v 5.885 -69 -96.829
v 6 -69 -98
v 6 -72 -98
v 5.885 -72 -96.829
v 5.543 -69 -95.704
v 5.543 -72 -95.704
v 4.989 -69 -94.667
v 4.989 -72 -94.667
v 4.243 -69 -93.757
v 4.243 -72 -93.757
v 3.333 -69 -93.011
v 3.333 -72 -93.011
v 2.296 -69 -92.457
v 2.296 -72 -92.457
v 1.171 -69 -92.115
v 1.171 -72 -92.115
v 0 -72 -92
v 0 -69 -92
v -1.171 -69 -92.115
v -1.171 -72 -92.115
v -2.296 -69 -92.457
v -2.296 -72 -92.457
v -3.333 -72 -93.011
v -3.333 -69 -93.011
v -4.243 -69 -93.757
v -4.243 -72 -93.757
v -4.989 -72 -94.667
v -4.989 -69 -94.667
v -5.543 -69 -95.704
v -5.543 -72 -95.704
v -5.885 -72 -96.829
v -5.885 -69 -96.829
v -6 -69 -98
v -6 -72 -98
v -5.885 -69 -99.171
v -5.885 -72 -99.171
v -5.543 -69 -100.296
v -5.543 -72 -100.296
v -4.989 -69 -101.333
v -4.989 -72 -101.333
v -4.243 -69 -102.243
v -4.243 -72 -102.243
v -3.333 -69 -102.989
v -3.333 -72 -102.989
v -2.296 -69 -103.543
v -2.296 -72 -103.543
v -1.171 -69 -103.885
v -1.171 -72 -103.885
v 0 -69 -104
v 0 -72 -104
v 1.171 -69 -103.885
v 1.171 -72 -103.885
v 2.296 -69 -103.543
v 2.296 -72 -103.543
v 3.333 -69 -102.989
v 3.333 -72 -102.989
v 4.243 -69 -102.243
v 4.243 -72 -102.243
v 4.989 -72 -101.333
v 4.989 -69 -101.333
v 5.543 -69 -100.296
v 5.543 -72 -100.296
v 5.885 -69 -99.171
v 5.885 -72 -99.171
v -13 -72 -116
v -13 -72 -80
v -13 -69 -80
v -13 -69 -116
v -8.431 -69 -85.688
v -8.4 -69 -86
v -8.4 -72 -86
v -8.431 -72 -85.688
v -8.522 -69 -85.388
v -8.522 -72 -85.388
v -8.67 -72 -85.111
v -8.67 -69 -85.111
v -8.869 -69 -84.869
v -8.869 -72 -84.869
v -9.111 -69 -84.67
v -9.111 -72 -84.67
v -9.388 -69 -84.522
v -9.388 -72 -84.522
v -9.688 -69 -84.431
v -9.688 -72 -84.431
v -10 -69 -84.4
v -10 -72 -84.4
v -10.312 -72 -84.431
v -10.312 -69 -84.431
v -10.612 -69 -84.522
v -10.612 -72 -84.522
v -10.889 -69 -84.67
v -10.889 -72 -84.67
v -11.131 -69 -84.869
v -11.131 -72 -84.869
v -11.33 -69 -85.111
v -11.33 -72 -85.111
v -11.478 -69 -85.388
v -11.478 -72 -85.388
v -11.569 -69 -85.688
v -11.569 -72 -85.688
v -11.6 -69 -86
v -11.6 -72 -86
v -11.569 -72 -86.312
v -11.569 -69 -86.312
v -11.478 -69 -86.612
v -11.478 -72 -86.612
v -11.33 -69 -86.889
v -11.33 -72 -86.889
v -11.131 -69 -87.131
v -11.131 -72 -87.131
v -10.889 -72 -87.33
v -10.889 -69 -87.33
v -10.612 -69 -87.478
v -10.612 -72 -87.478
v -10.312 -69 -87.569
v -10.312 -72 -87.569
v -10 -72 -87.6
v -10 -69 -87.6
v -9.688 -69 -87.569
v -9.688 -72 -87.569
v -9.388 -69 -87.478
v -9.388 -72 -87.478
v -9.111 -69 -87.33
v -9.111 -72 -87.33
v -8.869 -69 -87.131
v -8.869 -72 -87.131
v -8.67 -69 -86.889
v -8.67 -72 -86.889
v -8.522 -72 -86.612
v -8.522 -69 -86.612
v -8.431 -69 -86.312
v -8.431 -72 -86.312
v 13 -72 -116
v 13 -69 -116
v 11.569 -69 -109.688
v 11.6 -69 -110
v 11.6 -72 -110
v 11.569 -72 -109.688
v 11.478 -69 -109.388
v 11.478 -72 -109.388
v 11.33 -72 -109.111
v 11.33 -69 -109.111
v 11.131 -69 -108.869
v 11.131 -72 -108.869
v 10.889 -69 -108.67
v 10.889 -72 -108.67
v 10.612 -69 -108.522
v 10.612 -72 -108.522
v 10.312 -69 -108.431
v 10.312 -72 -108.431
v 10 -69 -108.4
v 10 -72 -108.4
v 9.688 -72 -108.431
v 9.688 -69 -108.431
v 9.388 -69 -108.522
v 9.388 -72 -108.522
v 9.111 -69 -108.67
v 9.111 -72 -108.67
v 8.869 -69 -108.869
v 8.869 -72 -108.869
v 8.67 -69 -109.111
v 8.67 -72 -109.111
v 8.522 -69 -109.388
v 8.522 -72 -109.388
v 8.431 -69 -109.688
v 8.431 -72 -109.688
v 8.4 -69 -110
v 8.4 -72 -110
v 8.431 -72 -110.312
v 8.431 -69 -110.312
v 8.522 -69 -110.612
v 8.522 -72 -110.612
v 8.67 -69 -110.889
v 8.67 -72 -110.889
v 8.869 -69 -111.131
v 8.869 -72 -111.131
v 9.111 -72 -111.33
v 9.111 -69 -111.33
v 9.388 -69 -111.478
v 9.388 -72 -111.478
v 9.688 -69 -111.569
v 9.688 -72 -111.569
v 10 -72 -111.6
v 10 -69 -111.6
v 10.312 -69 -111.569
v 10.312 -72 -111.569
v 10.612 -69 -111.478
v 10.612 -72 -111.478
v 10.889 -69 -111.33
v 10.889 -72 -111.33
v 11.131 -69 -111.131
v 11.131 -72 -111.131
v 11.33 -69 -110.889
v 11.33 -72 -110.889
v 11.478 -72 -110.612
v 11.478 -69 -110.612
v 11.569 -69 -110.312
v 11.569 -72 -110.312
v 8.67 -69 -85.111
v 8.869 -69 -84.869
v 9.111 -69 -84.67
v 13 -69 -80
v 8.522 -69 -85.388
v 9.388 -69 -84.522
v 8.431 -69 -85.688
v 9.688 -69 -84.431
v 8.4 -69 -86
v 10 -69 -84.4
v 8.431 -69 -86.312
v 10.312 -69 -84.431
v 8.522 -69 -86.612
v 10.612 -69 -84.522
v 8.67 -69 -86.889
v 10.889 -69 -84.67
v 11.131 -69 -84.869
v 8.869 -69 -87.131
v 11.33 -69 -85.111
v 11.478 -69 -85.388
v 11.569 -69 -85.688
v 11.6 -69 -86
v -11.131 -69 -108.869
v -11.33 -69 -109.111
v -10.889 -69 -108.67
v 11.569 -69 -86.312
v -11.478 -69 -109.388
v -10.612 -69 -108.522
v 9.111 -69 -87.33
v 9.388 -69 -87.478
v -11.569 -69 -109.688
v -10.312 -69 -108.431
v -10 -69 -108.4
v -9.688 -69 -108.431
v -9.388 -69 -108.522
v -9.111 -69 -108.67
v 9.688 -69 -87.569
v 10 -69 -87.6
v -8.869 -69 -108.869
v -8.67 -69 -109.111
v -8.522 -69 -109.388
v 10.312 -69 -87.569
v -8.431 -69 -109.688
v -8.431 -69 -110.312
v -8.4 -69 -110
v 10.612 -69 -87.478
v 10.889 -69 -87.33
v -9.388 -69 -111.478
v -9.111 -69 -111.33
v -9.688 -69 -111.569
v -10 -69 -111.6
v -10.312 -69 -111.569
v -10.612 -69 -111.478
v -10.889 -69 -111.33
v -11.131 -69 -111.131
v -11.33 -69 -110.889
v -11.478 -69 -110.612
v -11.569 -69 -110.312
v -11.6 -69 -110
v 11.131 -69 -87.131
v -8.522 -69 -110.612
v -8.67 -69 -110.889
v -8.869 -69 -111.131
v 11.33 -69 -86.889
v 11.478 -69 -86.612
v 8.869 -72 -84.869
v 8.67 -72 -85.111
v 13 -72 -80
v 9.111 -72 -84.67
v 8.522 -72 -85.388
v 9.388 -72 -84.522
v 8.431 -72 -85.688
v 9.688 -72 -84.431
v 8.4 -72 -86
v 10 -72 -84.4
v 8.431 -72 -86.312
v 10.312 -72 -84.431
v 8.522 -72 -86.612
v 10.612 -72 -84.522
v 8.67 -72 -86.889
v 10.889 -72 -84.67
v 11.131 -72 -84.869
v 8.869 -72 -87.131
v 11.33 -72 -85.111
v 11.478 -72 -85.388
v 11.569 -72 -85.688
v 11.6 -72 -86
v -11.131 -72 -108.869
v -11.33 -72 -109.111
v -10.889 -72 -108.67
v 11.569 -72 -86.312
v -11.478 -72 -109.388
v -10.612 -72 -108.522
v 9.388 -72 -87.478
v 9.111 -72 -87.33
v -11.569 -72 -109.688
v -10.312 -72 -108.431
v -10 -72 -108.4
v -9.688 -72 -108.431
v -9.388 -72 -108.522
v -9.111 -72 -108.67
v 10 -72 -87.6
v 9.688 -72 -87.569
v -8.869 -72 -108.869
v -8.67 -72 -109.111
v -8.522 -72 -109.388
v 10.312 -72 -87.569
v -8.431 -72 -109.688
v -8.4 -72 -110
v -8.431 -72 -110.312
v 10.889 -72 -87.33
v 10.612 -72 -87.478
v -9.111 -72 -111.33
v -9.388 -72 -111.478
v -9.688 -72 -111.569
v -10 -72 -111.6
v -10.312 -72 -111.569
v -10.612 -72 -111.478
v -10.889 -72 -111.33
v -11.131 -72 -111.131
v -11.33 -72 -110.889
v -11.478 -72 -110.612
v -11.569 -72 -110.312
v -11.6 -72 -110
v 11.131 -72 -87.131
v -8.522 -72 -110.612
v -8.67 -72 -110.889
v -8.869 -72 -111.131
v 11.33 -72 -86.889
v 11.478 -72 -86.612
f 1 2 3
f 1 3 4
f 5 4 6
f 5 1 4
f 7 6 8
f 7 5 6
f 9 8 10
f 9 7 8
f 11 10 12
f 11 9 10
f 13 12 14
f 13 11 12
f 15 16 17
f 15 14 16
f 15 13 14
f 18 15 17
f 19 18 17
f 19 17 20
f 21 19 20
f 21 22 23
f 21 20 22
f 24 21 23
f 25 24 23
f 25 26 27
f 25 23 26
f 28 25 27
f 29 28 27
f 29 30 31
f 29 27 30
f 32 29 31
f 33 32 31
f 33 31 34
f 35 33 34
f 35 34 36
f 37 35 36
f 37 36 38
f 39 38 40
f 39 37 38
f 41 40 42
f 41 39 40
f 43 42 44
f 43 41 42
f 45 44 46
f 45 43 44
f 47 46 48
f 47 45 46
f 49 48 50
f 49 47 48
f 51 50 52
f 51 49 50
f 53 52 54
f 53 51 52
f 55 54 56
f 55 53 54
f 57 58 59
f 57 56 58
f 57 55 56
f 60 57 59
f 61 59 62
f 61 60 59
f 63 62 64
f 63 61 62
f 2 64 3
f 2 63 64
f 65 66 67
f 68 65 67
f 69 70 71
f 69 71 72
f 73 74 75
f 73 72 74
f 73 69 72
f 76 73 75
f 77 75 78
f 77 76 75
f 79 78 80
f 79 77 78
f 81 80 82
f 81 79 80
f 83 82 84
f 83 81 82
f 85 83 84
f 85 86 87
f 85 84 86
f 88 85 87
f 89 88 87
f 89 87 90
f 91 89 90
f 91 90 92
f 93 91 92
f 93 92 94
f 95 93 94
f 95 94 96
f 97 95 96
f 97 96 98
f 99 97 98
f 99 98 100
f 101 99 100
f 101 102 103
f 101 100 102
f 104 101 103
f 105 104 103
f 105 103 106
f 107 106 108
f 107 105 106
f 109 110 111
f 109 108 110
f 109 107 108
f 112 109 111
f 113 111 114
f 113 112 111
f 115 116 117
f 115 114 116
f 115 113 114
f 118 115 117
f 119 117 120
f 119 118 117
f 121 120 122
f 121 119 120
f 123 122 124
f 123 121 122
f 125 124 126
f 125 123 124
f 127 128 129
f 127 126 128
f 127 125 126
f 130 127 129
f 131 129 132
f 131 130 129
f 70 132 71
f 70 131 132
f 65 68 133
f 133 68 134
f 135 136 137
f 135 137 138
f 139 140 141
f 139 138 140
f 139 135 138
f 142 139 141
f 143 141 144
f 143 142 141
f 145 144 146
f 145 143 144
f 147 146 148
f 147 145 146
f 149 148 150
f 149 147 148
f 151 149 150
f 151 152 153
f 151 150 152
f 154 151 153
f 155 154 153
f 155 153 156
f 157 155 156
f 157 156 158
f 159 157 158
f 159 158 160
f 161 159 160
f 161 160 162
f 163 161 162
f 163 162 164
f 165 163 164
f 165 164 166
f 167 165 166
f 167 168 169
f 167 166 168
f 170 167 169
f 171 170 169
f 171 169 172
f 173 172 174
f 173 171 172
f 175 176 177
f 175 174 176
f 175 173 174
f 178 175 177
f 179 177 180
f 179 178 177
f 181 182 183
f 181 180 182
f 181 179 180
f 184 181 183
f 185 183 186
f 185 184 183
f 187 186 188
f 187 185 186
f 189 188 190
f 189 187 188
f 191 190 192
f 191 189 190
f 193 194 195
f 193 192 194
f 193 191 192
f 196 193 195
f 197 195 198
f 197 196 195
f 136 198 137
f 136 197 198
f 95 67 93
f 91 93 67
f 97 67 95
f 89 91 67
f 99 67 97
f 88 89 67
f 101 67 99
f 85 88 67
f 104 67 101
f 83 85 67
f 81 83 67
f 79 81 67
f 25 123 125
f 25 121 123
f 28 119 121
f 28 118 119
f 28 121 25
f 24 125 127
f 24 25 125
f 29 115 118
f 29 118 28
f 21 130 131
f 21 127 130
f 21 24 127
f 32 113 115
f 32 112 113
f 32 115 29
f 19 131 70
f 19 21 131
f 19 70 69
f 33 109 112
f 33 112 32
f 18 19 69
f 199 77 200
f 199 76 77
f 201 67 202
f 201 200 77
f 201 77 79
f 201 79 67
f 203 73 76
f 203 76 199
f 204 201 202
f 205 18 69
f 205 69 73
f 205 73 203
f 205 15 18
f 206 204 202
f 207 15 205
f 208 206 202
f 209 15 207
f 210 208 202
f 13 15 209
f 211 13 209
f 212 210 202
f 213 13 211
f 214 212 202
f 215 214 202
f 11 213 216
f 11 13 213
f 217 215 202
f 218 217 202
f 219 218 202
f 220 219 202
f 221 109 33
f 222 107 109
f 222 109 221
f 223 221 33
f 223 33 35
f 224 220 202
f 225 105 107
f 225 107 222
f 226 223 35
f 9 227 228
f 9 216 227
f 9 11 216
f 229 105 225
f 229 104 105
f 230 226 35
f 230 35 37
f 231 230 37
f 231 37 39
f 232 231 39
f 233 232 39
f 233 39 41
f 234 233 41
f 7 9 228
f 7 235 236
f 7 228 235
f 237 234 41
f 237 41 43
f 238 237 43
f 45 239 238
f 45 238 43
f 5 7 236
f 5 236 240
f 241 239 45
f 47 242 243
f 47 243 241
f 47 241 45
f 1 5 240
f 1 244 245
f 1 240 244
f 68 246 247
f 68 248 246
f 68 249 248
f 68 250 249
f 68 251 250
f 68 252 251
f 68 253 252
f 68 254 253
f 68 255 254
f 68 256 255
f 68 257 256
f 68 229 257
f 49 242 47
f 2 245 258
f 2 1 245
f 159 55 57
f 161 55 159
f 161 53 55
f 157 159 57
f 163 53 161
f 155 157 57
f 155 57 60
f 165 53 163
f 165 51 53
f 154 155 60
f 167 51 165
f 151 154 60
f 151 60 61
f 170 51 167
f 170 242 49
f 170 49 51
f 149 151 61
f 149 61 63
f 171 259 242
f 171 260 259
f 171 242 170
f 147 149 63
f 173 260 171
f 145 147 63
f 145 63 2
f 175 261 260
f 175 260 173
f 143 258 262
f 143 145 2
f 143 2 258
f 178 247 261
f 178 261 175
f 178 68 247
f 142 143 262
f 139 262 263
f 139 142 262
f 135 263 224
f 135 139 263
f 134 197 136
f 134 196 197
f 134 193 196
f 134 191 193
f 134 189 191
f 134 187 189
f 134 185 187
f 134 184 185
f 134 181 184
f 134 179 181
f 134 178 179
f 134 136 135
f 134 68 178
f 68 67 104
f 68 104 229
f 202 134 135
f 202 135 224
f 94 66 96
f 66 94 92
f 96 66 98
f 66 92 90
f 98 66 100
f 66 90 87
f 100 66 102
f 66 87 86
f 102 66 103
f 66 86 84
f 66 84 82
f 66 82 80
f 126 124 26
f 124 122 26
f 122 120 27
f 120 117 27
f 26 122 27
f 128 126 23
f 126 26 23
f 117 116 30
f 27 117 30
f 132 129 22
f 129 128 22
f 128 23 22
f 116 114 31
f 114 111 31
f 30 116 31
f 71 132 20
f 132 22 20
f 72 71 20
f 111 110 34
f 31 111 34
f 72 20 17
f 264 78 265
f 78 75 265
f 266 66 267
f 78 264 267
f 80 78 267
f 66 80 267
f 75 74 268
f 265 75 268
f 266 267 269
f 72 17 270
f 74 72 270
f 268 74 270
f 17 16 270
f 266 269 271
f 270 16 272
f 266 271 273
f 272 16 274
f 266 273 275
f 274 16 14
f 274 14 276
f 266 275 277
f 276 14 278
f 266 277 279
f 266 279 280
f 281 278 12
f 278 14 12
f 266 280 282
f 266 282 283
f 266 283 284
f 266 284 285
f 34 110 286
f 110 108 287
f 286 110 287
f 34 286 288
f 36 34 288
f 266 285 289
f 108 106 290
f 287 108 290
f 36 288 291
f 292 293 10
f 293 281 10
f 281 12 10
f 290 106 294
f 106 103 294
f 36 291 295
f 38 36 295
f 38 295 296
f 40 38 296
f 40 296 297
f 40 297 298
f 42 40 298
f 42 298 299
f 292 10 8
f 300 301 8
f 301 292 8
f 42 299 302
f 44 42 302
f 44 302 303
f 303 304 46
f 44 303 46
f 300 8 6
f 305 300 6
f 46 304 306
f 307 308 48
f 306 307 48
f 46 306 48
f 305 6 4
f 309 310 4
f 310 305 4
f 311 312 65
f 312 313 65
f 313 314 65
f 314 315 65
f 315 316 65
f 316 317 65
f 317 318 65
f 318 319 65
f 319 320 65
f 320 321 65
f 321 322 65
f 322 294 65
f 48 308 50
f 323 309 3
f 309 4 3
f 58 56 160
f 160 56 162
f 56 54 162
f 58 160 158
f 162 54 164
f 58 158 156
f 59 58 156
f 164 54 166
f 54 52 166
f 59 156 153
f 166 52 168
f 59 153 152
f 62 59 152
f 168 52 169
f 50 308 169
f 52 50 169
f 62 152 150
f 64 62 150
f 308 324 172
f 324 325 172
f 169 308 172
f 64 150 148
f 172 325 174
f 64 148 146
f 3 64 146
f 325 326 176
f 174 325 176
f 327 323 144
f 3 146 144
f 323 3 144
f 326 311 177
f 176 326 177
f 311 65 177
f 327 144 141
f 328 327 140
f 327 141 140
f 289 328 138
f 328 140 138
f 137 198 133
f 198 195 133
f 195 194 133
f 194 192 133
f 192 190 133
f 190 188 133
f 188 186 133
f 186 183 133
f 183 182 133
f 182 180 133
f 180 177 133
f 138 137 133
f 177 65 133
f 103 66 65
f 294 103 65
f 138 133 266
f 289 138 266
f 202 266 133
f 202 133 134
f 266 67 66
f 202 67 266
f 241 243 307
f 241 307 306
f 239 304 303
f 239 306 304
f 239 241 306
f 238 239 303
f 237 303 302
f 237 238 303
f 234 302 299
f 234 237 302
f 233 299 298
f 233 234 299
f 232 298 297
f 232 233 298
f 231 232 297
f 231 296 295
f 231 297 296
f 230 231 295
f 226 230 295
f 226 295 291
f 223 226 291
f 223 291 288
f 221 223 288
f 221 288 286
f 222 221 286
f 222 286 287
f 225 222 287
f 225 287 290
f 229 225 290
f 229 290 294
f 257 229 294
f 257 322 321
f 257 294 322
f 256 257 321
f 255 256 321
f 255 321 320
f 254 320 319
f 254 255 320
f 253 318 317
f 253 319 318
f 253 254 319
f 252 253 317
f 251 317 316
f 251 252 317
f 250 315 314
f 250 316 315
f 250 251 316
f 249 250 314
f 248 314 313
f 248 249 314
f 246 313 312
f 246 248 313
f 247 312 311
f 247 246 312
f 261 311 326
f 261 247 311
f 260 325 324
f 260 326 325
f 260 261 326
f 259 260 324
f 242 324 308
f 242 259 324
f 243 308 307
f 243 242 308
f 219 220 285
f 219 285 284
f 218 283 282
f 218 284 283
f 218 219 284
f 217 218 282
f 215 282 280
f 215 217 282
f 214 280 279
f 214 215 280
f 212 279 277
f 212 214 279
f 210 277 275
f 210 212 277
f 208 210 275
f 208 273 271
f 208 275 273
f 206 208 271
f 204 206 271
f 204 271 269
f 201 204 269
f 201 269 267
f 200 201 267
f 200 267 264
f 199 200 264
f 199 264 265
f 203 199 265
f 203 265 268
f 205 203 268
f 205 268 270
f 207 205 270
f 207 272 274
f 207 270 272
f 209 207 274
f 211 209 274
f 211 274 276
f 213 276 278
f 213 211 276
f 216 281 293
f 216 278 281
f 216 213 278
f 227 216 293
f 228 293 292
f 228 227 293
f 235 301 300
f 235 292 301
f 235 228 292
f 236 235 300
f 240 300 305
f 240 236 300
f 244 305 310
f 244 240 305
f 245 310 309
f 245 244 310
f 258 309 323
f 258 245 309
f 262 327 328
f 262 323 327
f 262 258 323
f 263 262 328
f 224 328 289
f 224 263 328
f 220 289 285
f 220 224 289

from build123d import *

# Parameters (mm, degrees)
CYLINDER1875_R     = 1.6
CYLINDER1875_DEPTH = 80
CYLINDER1873_R     = 1.6
CYLINDER1873_DEPTH = 80
CYLINDER1874_R     = 1.6
CYLINDER1874_DEPTH = 80
CYLINDER1872_R     = 1.6
CYLINDER1872_DEPTH = 80
CYLINDER1871_R     = 6
CYLINDER1871_DEPTH = 20
BOX745_W           = 26
BOX745_H           = 3
BOX745_DEPTH       = 36


with BuildPart() as v_lec1875:
    # Cylinder1875 → Cylinder1875 (new body)
    with BuildSketch(Plane(origin=(-10, 80, 31), x_dir=(1, 0, 0), z_dir=(0, -1, 0))):
        Circle(CYLINDER1875_R)
    extrude(amount=CYLINDER1875_DEPTH)


with BuildPart() as v_lec1873:
    # Cylinder1873 → Cylinder1873 (new body)
    with BuildSketch(Plane(origin=(10, 80, 55), x_dir=(1, 0, 0), z_dir=(0, -1, 0))):
        Circle(CYLINDER1873_R)
    extrude(amount=CYLINDER1873_DEPTH)


with BuildPart() as v_lec1874:
    # Cylinder1874 → Cylinder1874 (new body)
    with BuildSketch(Plane(origin=(10, 80, 31), x_dir=(1, 0, 0), z_dir=(0, -1, 0))):
        Circle(CYLINDER1874_R)
    extrude(amount=CYLINDER1874_DEPTH)


with BuildPart() as compound844:
    # Cylinder1872 → Cylinder1872 (new body)
    with BuildSketch(Plane(origin=(-10, 80, 55), x_dir=(1, 0, 0), z_dir=(0, -1, 0))):
        Circle(CYLINDER1872_R)
    extrude(amount=CYLINDER1872_DEPTH)

    # Compound844: union Válec1875, Válec1873, Válec1874
    add(v_lec1875.part)
    add(v_lec1873.part)
    add(v_lec1874.part)


with BuildPart() as compound844_1:
    # Compound844 placement: moved
    add(compound844.part.moved(Location((0, -90, -141))))


with BuildPart() as v_lec1871:
    # Cylinder1871 → Cylinder1871 (new body)
    with BuildSketch(Plane(origin=(0, -60, -98), x_dir=(1, 0, 0), z_dir=(0, -1, 0))):
        Circle(CYLINDER1871_R)
    extrude(amount=CYLINDER1871_DEPTH)


with BuildPart() as cut683:
    # Box745 → Box745 (new body)
    with BuildSketch(Plane(origin=(-13, -72, -116), x_dir=(1, 0, 0), z_dir=(0, 0, 1))):
        with Locations((13, 1.5)):
            Rectangle(BOX745_W, BOX745_H)
    extrude(amount=BOX745_DEPTH)

    # Cut682: cut Válec1871
    add(v_lec1871.part, mode=Mode.SUBTRACT)

    # Cut683: cut Compound844
    add(compound844_1.part, mode=Mode.SUBTRACT)


solid = cut683.part
